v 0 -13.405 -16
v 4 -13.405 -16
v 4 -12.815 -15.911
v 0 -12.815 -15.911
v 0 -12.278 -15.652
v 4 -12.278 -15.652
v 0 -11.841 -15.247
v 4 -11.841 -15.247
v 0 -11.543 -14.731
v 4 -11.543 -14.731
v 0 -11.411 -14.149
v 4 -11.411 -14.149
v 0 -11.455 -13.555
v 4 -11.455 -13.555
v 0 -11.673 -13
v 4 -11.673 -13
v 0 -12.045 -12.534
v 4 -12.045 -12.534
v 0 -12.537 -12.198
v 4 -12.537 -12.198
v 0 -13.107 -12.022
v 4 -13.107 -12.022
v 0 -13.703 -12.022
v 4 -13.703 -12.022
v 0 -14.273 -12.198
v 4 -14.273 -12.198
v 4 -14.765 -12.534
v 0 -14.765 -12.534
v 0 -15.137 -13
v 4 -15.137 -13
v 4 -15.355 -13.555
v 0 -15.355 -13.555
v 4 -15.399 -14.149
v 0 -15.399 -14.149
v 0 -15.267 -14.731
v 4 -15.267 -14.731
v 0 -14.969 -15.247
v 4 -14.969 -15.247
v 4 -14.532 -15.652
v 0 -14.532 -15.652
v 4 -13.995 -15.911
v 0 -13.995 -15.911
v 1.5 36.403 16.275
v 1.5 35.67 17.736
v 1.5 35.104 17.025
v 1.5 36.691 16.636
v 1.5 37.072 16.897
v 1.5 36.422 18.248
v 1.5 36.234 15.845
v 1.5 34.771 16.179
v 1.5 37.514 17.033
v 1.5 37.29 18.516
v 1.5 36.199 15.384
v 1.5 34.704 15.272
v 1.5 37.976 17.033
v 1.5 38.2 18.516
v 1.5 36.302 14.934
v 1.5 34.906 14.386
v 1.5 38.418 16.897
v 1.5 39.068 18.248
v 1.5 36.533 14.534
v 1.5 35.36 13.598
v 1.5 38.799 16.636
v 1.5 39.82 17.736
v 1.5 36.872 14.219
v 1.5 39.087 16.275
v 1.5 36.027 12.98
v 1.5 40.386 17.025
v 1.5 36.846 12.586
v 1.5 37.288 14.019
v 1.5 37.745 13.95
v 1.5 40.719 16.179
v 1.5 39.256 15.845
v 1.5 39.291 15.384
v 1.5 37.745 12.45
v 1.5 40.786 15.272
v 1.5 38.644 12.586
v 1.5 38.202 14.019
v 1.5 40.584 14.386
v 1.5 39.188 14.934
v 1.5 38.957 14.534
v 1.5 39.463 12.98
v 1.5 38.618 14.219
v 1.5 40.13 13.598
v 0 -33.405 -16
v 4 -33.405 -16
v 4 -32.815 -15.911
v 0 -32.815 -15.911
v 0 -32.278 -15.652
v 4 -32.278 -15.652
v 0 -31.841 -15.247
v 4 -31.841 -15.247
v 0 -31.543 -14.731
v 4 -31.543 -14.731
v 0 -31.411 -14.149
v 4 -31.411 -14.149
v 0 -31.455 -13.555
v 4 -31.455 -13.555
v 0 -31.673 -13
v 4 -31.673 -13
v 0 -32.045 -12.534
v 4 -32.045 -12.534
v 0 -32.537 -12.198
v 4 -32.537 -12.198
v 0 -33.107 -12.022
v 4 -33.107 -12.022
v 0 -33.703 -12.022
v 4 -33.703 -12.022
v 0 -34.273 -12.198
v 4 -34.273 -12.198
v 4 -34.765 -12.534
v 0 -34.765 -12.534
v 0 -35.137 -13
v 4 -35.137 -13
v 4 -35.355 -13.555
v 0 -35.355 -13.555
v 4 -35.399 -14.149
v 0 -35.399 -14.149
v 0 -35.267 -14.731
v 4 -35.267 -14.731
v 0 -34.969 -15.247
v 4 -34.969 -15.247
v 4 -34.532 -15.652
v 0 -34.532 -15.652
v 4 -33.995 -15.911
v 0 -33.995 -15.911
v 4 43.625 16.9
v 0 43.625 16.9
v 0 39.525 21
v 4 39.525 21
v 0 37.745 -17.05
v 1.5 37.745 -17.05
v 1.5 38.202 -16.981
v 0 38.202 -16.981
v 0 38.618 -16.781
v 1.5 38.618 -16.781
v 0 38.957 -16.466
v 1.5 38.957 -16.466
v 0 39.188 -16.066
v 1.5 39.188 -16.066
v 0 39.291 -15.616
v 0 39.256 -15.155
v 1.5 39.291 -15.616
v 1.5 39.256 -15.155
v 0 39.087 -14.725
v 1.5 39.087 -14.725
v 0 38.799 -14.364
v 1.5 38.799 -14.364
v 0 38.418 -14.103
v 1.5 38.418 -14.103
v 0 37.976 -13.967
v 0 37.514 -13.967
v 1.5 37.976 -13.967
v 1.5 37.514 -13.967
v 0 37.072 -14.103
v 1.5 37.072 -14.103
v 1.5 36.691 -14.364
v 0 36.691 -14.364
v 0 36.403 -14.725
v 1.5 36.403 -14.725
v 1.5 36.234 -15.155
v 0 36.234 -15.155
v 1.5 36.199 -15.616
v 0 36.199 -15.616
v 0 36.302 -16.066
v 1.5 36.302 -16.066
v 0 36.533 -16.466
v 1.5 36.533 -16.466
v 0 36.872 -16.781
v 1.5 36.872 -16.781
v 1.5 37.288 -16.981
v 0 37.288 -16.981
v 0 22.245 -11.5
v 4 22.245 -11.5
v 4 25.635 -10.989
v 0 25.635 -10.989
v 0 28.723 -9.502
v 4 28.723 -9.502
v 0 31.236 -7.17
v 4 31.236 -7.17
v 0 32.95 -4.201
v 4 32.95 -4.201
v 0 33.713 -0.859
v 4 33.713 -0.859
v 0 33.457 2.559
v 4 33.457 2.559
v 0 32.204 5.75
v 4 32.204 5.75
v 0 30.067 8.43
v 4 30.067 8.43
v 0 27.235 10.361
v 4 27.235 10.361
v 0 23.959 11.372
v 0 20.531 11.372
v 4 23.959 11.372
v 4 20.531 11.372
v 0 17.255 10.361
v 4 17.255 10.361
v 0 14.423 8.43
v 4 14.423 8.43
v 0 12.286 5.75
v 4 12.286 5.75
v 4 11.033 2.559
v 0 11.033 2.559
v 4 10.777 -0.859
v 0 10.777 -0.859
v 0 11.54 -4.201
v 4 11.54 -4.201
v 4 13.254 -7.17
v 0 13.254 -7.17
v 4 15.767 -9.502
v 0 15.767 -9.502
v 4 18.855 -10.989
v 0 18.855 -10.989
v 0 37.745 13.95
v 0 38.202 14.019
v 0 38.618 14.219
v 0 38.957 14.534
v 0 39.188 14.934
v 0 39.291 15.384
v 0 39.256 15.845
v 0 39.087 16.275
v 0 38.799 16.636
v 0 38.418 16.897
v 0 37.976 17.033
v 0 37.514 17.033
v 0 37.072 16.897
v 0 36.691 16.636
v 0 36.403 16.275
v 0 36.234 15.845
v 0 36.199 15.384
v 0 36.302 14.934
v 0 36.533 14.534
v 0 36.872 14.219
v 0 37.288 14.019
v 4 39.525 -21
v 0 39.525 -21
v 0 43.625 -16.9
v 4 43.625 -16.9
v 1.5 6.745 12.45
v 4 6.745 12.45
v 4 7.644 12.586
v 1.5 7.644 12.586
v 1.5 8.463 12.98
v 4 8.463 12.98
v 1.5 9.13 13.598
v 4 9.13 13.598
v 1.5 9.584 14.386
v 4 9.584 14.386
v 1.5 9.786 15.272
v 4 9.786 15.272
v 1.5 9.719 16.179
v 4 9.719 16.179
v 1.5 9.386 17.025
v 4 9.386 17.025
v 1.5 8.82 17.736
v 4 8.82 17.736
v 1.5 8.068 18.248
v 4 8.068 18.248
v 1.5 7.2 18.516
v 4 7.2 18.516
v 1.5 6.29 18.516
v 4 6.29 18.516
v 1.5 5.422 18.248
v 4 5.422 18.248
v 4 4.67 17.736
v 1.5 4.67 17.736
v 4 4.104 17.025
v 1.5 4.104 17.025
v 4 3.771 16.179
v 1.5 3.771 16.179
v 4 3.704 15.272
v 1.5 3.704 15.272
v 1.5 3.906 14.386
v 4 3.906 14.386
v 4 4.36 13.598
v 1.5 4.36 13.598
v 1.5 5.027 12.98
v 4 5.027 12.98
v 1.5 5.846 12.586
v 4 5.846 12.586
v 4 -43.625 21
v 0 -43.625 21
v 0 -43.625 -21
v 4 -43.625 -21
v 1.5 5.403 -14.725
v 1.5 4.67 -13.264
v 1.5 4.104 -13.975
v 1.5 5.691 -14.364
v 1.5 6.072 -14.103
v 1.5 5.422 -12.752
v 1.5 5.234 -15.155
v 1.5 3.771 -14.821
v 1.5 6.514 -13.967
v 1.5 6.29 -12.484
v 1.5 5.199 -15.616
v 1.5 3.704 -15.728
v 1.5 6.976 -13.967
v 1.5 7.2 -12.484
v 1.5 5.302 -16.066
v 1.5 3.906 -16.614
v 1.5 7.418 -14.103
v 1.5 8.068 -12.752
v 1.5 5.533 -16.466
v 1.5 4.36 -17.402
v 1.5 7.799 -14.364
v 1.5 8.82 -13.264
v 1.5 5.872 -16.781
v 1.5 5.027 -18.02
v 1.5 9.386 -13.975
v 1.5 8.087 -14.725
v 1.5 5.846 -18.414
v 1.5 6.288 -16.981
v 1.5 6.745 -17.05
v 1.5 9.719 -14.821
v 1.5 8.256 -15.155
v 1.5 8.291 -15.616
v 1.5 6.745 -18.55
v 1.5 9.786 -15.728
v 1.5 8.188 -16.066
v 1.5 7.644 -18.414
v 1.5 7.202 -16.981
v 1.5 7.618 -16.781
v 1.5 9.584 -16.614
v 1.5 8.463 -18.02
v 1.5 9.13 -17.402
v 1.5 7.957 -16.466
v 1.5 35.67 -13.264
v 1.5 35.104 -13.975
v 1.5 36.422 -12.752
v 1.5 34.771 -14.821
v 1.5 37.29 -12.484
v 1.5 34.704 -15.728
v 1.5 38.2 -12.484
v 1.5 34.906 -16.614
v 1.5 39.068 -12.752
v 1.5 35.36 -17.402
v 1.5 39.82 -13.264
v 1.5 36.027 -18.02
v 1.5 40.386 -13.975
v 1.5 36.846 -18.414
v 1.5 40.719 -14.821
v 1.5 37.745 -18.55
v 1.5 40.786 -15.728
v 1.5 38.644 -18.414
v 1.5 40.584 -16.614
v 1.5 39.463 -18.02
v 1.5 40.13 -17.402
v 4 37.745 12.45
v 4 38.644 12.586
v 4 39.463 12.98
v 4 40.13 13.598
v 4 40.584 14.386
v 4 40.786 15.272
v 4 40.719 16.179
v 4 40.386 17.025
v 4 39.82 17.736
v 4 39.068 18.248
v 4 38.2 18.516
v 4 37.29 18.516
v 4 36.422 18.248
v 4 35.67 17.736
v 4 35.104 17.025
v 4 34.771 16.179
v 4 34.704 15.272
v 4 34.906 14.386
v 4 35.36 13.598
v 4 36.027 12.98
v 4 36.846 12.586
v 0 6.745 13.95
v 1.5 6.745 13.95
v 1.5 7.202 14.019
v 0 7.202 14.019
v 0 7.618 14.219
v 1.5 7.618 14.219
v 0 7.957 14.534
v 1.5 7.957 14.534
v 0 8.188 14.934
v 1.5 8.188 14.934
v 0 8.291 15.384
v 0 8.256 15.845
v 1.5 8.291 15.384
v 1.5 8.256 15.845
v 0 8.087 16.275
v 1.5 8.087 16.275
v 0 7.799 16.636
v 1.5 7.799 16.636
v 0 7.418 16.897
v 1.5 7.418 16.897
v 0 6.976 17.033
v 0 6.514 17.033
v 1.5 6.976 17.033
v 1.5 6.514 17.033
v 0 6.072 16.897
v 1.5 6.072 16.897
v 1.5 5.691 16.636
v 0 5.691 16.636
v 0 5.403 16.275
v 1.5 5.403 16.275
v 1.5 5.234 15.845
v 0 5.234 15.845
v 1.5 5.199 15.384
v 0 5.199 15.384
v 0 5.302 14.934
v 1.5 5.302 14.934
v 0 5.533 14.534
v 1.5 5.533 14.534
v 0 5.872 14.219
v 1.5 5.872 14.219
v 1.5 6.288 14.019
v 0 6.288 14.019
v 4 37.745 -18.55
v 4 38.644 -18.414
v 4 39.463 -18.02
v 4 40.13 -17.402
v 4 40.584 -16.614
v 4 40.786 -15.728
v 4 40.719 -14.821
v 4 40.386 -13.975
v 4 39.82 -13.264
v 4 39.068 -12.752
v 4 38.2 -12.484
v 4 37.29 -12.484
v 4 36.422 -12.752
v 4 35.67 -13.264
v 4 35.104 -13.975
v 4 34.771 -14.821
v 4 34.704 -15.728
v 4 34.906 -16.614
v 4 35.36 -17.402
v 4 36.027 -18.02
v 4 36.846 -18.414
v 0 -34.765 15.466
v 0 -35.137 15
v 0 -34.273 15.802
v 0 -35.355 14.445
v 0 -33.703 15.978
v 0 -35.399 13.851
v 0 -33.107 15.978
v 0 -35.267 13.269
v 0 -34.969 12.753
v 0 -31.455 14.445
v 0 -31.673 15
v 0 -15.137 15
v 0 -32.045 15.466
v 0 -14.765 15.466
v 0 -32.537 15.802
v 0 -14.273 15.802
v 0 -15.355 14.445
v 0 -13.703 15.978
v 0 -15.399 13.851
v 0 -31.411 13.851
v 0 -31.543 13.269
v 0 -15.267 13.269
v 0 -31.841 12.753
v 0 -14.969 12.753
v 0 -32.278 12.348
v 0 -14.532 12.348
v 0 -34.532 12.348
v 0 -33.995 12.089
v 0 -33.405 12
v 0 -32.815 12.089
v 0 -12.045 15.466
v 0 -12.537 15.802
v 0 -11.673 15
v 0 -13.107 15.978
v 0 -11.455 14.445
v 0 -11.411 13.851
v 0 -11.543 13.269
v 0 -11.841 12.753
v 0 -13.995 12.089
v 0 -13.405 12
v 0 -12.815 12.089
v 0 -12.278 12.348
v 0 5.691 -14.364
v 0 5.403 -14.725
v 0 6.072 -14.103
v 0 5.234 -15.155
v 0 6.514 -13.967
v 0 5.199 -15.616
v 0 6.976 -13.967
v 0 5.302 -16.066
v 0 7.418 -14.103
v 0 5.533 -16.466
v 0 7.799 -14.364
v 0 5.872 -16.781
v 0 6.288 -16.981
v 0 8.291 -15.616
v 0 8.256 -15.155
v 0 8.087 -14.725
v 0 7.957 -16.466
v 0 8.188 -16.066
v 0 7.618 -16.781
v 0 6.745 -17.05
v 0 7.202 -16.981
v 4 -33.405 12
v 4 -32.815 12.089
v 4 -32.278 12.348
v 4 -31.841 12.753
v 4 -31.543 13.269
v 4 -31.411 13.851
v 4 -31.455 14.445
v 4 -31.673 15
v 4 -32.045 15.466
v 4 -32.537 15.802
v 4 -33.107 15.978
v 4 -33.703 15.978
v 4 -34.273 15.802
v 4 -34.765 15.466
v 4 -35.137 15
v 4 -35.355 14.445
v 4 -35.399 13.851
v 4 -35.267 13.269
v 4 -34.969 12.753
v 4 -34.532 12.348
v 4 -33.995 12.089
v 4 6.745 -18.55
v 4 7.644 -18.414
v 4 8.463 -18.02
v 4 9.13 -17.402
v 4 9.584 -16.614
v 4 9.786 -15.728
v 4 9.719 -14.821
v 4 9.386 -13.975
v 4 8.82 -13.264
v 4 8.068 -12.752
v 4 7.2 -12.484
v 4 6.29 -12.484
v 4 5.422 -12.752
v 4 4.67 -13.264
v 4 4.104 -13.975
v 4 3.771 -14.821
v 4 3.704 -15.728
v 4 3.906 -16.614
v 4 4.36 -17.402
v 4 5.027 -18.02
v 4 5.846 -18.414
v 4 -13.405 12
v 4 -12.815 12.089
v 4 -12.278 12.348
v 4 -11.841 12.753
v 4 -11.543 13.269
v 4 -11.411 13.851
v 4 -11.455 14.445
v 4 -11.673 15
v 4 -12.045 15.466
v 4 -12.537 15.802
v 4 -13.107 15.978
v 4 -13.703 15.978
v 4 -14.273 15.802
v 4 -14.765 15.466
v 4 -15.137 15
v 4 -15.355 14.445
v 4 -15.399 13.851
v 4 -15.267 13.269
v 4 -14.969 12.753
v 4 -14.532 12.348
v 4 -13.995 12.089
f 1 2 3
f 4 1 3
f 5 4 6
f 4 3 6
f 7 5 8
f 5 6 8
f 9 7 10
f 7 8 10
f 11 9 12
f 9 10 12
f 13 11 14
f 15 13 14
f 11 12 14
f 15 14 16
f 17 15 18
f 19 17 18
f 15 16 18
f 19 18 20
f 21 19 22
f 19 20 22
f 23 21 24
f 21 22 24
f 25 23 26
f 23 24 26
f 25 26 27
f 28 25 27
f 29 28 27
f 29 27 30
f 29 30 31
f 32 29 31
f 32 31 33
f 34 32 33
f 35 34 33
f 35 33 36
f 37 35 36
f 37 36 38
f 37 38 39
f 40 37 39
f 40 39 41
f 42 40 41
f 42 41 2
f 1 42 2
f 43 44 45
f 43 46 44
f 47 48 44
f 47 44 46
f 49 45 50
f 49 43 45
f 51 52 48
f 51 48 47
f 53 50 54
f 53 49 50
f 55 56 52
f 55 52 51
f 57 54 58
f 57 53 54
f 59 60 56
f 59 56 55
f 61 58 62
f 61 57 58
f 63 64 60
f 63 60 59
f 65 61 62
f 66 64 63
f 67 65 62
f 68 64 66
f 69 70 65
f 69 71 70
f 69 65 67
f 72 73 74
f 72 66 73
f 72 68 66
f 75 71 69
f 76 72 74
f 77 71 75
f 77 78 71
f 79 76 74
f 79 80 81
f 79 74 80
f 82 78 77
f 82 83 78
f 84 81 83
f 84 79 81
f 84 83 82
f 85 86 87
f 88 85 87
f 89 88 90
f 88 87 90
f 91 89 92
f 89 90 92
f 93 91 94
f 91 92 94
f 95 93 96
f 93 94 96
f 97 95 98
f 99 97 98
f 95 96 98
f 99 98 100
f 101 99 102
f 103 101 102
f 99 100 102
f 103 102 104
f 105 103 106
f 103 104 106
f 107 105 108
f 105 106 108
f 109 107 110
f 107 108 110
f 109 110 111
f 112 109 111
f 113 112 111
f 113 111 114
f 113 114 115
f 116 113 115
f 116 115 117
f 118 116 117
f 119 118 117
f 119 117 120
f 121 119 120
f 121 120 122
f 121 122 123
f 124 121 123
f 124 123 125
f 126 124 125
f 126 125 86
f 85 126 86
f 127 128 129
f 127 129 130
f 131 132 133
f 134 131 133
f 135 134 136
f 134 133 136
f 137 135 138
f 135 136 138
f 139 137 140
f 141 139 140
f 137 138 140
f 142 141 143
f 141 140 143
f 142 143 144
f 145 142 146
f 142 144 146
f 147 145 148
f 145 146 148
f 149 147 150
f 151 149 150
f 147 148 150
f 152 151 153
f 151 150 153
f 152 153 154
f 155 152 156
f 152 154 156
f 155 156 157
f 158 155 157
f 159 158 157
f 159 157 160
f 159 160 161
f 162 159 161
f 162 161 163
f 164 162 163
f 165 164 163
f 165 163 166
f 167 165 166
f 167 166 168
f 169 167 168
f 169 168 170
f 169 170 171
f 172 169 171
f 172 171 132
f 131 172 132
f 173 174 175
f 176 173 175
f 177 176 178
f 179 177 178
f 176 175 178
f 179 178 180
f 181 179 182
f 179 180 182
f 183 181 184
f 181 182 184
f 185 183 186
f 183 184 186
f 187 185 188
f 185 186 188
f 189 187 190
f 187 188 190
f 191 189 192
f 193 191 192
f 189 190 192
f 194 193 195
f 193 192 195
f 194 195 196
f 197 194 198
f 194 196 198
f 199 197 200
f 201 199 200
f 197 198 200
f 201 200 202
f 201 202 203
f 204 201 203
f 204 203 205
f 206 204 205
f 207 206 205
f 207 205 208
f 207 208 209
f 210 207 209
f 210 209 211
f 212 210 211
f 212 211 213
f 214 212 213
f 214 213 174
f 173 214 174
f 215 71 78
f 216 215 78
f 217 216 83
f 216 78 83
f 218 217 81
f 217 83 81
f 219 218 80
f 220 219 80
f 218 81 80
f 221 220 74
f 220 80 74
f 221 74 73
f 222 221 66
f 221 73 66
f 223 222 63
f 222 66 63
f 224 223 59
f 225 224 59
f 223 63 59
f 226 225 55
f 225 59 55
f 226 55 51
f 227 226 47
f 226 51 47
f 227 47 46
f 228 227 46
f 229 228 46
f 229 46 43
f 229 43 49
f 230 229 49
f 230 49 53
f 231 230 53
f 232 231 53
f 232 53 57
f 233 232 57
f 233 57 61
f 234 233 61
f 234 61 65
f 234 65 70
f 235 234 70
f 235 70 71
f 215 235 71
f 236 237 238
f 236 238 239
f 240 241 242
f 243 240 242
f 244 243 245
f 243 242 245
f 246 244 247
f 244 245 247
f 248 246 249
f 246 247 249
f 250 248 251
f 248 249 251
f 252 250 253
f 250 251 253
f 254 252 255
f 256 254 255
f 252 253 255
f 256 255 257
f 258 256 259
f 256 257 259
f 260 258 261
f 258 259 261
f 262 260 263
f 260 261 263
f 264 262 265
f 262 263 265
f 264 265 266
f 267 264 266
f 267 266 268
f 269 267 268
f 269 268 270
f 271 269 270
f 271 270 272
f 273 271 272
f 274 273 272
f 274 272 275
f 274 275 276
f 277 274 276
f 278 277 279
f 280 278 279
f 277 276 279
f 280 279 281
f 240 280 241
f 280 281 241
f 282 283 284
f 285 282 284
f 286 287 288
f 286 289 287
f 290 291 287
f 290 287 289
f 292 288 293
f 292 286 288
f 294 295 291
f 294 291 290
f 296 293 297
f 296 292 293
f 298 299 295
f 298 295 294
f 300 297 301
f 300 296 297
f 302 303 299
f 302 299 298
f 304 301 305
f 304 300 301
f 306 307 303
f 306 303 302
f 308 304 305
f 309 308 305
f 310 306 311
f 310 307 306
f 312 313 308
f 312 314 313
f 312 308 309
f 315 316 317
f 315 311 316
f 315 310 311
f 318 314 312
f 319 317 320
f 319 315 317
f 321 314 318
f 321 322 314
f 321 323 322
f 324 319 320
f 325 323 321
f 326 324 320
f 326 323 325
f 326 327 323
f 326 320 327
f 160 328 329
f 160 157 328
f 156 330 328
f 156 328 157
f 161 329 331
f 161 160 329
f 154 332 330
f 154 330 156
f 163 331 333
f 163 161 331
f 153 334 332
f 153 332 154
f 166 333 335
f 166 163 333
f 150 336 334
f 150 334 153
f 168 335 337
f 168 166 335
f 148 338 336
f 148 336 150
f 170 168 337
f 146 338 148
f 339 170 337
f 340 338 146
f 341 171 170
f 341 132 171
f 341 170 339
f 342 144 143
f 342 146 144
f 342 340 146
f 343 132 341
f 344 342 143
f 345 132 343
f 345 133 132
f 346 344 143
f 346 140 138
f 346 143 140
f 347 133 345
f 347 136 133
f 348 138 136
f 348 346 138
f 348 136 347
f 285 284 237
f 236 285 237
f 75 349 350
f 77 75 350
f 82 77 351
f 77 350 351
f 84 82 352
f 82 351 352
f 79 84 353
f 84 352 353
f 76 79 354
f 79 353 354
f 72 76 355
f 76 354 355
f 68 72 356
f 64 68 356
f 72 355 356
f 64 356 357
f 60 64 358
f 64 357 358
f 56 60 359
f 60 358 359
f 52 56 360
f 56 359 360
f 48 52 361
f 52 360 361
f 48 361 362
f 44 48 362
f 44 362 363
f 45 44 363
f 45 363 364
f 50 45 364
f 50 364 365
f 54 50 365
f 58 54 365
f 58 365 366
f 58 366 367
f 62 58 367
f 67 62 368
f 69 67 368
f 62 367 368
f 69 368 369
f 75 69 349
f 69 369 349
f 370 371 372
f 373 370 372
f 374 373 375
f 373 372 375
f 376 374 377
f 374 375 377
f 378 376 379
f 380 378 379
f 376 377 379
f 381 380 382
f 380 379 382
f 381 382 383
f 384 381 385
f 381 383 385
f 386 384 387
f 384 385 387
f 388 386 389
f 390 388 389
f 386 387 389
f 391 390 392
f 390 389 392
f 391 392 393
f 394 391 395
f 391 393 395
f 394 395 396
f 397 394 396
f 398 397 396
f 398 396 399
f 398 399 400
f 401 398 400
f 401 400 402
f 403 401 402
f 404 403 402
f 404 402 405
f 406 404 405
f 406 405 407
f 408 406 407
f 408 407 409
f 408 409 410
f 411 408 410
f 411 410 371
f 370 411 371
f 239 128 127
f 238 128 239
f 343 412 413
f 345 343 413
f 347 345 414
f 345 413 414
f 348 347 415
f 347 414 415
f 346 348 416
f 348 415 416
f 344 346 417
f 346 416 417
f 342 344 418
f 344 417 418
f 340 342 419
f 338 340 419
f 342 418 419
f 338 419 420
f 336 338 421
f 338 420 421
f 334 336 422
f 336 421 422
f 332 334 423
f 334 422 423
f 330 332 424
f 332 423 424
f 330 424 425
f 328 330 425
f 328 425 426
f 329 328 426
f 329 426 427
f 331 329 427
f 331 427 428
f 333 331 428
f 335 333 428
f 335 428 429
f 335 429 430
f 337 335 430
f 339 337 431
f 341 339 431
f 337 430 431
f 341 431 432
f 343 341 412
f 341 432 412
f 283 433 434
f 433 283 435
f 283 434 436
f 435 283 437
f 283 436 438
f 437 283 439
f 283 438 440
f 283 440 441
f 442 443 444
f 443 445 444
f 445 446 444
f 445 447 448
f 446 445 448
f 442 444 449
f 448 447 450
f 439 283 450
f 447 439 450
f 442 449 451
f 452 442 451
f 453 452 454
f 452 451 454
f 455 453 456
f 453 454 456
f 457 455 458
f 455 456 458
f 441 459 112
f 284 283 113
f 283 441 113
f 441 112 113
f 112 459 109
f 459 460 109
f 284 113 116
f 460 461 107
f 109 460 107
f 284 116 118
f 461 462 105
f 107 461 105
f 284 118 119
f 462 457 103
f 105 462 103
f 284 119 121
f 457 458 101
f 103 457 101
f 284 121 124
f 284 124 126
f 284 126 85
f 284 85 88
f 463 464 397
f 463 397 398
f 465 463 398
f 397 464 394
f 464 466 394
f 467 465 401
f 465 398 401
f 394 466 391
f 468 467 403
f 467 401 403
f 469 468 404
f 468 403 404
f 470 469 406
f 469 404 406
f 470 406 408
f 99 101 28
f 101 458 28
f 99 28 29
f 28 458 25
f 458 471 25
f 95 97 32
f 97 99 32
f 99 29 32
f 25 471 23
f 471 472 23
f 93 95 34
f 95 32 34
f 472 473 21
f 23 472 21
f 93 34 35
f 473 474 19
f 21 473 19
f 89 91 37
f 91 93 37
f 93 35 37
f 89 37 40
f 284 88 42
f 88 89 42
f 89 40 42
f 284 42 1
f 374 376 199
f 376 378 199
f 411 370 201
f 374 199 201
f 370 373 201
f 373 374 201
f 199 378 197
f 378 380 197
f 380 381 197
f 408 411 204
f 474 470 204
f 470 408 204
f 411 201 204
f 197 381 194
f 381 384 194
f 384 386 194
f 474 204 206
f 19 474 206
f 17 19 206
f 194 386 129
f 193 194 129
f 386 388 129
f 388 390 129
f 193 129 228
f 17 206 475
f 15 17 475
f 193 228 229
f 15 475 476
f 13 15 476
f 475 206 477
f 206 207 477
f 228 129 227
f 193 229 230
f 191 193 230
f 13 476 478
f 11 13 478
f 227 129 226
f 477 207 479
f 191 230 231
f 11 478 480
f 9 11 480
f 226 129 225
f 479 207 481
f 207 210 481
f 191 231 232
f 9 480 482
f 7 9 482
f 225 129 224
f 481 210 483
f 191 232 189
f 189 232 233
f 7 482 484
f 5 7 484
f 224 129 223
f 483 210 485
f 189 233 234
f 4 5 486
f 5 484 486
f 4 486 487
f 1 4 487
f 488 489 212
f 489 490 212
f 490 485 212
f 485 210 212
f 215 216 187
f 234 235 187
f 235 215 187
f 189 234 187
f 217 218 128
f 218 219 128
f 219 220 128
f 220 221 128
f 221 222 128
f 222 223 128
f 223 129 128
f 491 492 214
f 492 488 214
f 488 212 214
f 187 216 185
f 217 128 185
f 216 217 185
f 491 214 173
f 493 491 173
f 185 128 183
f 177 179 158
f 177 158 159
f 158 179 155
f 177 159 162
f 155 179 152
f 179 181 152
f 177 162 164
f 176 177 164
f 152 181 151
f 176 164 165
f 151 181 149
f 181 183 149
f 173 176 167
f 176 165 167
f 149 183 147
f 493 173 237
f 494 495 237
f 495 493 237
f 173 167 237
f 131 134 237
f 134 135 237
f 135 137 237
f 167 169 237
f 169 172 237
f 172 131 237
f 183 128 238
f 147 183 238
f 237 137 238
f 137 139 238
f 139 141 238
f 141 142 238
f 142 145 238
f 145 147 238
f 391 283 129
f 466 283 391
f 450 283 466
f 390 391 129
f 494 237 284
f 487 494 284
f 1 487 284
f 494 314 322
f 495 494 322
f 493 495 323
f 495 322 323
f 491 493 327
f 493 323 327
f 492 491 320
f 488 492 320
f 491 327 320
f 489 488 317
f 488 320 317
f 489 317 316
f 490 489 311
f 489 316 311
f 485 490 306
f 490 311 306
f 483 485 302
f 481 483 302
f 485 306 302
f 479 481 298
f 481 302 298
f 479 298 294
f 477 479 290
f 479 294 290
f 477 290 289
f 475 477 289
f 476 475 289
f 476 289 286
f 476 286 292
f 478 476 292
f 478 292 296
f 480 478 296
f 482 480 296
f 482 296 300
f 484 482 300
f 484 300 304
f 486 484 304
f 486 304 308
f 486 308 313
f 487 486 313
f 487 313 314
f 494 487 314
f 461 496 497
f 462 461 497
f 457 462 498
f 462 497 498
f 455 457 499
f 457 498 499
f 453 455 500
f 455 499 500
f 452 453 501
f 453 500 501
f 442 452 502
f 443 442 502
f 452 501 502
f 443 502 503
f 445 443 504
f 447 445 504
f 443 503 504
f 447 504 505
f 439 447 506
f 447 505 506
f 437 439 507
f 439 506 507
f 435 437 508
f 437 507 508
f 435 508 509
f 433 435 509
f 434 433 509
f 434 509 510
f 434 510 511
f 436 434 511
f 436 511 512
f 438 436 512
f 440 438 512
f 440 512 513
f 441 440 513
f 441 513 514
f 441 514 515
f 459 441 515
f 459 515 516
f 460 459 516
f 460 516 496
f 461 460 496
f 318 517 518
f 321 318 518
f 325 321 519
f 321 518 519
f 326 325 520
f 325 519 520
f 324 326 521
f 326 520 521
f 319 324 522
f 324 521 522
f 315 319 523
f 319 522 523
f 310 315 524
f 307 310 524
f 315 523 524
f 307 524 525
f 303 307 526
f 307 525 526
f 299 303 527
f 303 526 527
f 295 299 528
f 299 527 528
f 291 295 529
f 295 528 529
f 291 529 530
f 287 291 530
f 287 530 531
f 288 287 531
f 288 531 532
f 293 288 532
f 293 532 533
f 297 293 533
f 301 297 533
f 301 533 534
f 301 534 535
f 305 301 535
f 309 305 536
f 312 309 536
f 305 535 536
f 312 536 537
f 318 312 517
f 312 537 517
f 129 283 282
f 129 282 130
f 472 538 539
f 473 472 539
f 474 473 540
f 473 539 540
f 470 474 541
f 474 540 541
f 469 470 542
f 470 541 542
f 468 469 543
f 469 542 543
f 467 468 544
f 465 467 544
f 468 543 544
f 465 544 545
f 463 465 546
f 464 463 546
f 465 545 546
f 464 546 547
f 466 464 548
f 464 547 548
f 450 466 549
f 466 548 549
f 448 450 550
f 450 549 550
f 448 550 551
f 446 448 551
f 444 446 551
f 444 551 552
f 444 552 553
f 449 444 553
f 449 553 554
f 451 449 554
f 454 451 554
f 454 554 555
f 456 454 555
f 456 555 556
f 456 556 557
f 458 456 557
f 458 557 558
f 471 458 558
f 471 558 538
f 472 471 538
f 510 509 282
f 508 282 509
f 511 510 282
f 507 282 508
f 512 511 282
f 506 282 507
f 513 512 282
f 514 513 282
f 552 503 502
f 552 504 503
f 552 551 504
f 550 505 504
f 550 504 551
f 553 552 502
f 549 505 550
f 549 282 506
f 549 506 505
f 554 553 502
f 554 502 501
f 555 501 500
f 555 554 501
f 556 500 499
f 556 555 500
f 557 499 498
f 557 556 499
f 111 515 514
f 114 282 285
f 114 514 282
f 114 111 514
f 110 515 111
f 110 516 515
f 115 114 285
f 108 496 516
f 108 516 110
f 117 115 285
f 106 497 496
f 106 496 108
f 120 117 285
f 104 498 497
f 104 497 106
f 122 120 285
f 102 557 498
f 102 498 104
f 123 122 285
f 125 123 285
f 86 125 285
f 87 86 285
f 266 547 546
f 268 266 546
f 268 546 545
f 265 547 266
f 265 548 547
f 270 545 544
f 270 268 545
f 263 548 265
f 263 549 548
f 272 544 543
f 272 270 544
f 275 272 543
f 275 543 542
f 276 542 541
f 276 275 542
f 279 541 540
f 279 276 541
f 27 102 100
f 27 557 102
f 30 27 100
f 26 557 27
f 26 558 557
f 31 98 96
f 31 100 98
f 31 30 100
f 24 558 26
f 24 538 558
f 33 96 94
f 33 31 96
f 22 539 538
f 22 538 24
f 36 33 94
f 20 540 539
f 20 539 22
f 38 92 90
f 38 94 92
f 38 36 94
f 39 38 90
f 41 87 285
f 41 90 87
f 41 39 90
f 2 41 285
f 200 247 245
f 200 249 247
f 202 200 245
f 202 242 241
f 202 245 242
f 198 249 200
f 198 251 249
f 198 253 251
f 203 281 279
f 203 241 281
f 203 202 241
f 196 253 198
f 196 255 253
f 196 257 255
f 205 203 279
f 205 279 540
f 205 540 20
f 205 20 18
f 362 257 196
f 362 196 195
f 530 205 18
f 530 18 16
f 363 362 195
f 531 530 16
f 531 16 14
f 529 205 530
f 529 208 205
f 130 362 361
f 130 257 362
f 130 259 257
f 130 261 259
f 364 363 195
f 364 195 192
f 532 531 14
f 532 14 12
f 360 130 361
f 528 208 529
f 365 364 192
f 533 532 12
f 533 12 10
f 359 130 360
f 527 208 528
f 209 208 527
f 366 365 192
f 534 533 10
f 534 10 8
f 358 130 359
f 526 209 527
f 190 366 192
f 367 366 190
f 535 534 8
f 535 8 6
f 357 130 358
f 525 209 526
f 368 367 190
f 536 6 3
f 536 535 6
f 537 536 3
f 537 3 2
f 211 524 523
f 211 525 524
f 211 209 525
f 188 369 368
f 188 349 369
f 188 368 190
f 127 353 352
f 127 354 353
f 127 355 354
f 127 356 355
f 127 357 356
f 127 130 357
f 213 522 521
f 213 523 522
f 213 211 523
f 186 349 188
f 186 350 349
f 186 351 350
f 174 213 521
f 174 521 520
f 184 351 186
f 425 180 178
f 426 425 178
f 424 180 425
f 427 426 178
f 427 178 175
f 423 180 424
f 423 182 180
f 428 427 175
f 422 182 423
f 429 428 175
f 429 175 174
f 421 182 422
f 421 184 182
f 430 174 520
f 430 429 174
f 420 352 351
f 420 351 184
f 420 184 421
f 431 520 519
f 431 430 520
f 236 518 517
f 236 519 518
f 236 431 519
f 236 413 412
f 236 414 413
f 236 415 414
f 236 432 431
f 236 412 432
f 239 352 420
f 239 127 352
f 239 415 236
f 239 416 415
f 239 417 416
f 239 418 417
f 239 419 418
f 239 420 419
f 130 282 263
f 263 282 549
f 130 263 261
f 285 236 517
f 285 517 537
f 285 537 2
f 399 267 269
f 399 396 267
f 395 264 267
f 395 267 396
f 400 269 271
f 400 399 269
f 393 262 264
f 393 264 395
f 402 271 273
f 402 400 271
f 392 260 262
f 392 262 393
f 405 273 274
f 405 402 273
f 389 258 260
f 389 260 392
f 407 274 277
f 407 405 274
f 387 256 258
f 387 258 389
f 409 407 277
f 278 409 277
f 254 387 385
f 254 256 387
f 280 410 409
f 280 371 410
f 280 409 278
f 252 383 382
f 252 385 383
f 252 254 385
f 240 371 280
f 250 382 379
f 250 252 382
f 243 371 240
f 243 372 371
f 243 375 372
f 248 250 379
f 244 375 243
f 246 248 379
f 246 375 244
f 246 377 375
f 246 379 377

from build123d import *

# Parameters (mm, degrees)
CROQUIS1_W              = 42
CROQUIS1_H              = 87.25
SALIENTE_EXTRUIR1_DEPTH = 4
CROQUIS2_R              = 1.55
CROQUIS2_R_2            = 11.5
CORTAR_EXTRUIR1_DEPTH   = 5
CROQUIS3_R              = 2
CORTAR_EXTRUIR2_DEPTH   = 5
CHAFL_N1_SIZE           = 4.1
CROQUIS8_R              = 3.05
CORTAR_EXTRUIR3_DEPTH   = 2.5


with BuildPart() as part:
    # Croquis1 → Saliente-Extruir1 (new body)
    with BuildSketch(Plane(origin=(0, 0, 0), x_dir=(0, 0, -1), z_dir=(1, 0, 0))):
        Rectangle(CROQUIS1_W, CROQUIS1_H)
    extrude(amount=SALIENTE_EXTRUIR1_DEPTH)

    # Croquis2 → Cortar-Extruir1 (cut, through all)
    with BuildSketch(Plane(origin=(4, 0, 0), x_dir=(0, 0, -1), z_dir=(1, 0, 0))):
        with Locations((-15.5, 37.745)):
            Circle(CROQUIS2_R)
        with Locations((15.5, 37.745)):
            Circle(CROQUIS2_R)
        with Locations((15.5, 6.745)):
            Circle(CROQUIS2_R)
        with Locations((-15.5, 6.745)):
            Circle(CROQUIS2_R)
        with Locations((0, 22.245)):
            Circle(CROQUIS2_R_2)
    extrude(amount=-CORTAR_EXTRUIR1_DEPTH, mode=Mode.SUBTRACT)

    # Croquis3 → Cortar-Extruir2 (cut, through all)
    with BuildSketch(Plane(origin=(4, 0, 0), x_dir=(0, 0, -1), z_dir=(1, 0, 0))):
        with Locations((-14, -13.405)):
            Circle(CROQUIS3_R)
        with Locations((14, -13.405)):
            Circle(CROQUIS3_R)
        with Locations((-14, -33.405)):
            Circle(CROQUIS3_R)
        with Locations((14, -33.405)):
            Circle(CROQUIS3_R)
    extrude(amount=-CORTAR_EXTRUIR2_DEPTH, mode=Mode.SUBTRACT)

    # Chaflán1
    chafl_n1_edges = [part.edges().sort_by_distance(p)[0] for p in [
        (2, 43.625, 21),
        (2, 43.625, -21),
    ]]
    chamfer(chafl_n1_edges, length=CHAFL_N1_SIZE)

    # Croquis8 → Cortar-Extruir3 (cut)
    with BuildSketch(Plane(origin=(4, 0, 0), x_dir=(0, 0, -1), z_dir=(1, 0, 0))):
        with Locations((15.5, 37.745)):
            Circle(CROQUIS8_R)
        with Locations((-15.5, 37.745)):
            Circle(CROQUIS8_R)
        with Locations((-15.5, 6.745)):
            Circle(CROQUIS8_R)
        with Locations((15.5, 6.745)):
            Circle(CROQUIS8_R)
    extrude(amount=-CORTAR_EXTRUIR3_DEPTH, mode=Mode.SUBTRACT)


solid = part.part
